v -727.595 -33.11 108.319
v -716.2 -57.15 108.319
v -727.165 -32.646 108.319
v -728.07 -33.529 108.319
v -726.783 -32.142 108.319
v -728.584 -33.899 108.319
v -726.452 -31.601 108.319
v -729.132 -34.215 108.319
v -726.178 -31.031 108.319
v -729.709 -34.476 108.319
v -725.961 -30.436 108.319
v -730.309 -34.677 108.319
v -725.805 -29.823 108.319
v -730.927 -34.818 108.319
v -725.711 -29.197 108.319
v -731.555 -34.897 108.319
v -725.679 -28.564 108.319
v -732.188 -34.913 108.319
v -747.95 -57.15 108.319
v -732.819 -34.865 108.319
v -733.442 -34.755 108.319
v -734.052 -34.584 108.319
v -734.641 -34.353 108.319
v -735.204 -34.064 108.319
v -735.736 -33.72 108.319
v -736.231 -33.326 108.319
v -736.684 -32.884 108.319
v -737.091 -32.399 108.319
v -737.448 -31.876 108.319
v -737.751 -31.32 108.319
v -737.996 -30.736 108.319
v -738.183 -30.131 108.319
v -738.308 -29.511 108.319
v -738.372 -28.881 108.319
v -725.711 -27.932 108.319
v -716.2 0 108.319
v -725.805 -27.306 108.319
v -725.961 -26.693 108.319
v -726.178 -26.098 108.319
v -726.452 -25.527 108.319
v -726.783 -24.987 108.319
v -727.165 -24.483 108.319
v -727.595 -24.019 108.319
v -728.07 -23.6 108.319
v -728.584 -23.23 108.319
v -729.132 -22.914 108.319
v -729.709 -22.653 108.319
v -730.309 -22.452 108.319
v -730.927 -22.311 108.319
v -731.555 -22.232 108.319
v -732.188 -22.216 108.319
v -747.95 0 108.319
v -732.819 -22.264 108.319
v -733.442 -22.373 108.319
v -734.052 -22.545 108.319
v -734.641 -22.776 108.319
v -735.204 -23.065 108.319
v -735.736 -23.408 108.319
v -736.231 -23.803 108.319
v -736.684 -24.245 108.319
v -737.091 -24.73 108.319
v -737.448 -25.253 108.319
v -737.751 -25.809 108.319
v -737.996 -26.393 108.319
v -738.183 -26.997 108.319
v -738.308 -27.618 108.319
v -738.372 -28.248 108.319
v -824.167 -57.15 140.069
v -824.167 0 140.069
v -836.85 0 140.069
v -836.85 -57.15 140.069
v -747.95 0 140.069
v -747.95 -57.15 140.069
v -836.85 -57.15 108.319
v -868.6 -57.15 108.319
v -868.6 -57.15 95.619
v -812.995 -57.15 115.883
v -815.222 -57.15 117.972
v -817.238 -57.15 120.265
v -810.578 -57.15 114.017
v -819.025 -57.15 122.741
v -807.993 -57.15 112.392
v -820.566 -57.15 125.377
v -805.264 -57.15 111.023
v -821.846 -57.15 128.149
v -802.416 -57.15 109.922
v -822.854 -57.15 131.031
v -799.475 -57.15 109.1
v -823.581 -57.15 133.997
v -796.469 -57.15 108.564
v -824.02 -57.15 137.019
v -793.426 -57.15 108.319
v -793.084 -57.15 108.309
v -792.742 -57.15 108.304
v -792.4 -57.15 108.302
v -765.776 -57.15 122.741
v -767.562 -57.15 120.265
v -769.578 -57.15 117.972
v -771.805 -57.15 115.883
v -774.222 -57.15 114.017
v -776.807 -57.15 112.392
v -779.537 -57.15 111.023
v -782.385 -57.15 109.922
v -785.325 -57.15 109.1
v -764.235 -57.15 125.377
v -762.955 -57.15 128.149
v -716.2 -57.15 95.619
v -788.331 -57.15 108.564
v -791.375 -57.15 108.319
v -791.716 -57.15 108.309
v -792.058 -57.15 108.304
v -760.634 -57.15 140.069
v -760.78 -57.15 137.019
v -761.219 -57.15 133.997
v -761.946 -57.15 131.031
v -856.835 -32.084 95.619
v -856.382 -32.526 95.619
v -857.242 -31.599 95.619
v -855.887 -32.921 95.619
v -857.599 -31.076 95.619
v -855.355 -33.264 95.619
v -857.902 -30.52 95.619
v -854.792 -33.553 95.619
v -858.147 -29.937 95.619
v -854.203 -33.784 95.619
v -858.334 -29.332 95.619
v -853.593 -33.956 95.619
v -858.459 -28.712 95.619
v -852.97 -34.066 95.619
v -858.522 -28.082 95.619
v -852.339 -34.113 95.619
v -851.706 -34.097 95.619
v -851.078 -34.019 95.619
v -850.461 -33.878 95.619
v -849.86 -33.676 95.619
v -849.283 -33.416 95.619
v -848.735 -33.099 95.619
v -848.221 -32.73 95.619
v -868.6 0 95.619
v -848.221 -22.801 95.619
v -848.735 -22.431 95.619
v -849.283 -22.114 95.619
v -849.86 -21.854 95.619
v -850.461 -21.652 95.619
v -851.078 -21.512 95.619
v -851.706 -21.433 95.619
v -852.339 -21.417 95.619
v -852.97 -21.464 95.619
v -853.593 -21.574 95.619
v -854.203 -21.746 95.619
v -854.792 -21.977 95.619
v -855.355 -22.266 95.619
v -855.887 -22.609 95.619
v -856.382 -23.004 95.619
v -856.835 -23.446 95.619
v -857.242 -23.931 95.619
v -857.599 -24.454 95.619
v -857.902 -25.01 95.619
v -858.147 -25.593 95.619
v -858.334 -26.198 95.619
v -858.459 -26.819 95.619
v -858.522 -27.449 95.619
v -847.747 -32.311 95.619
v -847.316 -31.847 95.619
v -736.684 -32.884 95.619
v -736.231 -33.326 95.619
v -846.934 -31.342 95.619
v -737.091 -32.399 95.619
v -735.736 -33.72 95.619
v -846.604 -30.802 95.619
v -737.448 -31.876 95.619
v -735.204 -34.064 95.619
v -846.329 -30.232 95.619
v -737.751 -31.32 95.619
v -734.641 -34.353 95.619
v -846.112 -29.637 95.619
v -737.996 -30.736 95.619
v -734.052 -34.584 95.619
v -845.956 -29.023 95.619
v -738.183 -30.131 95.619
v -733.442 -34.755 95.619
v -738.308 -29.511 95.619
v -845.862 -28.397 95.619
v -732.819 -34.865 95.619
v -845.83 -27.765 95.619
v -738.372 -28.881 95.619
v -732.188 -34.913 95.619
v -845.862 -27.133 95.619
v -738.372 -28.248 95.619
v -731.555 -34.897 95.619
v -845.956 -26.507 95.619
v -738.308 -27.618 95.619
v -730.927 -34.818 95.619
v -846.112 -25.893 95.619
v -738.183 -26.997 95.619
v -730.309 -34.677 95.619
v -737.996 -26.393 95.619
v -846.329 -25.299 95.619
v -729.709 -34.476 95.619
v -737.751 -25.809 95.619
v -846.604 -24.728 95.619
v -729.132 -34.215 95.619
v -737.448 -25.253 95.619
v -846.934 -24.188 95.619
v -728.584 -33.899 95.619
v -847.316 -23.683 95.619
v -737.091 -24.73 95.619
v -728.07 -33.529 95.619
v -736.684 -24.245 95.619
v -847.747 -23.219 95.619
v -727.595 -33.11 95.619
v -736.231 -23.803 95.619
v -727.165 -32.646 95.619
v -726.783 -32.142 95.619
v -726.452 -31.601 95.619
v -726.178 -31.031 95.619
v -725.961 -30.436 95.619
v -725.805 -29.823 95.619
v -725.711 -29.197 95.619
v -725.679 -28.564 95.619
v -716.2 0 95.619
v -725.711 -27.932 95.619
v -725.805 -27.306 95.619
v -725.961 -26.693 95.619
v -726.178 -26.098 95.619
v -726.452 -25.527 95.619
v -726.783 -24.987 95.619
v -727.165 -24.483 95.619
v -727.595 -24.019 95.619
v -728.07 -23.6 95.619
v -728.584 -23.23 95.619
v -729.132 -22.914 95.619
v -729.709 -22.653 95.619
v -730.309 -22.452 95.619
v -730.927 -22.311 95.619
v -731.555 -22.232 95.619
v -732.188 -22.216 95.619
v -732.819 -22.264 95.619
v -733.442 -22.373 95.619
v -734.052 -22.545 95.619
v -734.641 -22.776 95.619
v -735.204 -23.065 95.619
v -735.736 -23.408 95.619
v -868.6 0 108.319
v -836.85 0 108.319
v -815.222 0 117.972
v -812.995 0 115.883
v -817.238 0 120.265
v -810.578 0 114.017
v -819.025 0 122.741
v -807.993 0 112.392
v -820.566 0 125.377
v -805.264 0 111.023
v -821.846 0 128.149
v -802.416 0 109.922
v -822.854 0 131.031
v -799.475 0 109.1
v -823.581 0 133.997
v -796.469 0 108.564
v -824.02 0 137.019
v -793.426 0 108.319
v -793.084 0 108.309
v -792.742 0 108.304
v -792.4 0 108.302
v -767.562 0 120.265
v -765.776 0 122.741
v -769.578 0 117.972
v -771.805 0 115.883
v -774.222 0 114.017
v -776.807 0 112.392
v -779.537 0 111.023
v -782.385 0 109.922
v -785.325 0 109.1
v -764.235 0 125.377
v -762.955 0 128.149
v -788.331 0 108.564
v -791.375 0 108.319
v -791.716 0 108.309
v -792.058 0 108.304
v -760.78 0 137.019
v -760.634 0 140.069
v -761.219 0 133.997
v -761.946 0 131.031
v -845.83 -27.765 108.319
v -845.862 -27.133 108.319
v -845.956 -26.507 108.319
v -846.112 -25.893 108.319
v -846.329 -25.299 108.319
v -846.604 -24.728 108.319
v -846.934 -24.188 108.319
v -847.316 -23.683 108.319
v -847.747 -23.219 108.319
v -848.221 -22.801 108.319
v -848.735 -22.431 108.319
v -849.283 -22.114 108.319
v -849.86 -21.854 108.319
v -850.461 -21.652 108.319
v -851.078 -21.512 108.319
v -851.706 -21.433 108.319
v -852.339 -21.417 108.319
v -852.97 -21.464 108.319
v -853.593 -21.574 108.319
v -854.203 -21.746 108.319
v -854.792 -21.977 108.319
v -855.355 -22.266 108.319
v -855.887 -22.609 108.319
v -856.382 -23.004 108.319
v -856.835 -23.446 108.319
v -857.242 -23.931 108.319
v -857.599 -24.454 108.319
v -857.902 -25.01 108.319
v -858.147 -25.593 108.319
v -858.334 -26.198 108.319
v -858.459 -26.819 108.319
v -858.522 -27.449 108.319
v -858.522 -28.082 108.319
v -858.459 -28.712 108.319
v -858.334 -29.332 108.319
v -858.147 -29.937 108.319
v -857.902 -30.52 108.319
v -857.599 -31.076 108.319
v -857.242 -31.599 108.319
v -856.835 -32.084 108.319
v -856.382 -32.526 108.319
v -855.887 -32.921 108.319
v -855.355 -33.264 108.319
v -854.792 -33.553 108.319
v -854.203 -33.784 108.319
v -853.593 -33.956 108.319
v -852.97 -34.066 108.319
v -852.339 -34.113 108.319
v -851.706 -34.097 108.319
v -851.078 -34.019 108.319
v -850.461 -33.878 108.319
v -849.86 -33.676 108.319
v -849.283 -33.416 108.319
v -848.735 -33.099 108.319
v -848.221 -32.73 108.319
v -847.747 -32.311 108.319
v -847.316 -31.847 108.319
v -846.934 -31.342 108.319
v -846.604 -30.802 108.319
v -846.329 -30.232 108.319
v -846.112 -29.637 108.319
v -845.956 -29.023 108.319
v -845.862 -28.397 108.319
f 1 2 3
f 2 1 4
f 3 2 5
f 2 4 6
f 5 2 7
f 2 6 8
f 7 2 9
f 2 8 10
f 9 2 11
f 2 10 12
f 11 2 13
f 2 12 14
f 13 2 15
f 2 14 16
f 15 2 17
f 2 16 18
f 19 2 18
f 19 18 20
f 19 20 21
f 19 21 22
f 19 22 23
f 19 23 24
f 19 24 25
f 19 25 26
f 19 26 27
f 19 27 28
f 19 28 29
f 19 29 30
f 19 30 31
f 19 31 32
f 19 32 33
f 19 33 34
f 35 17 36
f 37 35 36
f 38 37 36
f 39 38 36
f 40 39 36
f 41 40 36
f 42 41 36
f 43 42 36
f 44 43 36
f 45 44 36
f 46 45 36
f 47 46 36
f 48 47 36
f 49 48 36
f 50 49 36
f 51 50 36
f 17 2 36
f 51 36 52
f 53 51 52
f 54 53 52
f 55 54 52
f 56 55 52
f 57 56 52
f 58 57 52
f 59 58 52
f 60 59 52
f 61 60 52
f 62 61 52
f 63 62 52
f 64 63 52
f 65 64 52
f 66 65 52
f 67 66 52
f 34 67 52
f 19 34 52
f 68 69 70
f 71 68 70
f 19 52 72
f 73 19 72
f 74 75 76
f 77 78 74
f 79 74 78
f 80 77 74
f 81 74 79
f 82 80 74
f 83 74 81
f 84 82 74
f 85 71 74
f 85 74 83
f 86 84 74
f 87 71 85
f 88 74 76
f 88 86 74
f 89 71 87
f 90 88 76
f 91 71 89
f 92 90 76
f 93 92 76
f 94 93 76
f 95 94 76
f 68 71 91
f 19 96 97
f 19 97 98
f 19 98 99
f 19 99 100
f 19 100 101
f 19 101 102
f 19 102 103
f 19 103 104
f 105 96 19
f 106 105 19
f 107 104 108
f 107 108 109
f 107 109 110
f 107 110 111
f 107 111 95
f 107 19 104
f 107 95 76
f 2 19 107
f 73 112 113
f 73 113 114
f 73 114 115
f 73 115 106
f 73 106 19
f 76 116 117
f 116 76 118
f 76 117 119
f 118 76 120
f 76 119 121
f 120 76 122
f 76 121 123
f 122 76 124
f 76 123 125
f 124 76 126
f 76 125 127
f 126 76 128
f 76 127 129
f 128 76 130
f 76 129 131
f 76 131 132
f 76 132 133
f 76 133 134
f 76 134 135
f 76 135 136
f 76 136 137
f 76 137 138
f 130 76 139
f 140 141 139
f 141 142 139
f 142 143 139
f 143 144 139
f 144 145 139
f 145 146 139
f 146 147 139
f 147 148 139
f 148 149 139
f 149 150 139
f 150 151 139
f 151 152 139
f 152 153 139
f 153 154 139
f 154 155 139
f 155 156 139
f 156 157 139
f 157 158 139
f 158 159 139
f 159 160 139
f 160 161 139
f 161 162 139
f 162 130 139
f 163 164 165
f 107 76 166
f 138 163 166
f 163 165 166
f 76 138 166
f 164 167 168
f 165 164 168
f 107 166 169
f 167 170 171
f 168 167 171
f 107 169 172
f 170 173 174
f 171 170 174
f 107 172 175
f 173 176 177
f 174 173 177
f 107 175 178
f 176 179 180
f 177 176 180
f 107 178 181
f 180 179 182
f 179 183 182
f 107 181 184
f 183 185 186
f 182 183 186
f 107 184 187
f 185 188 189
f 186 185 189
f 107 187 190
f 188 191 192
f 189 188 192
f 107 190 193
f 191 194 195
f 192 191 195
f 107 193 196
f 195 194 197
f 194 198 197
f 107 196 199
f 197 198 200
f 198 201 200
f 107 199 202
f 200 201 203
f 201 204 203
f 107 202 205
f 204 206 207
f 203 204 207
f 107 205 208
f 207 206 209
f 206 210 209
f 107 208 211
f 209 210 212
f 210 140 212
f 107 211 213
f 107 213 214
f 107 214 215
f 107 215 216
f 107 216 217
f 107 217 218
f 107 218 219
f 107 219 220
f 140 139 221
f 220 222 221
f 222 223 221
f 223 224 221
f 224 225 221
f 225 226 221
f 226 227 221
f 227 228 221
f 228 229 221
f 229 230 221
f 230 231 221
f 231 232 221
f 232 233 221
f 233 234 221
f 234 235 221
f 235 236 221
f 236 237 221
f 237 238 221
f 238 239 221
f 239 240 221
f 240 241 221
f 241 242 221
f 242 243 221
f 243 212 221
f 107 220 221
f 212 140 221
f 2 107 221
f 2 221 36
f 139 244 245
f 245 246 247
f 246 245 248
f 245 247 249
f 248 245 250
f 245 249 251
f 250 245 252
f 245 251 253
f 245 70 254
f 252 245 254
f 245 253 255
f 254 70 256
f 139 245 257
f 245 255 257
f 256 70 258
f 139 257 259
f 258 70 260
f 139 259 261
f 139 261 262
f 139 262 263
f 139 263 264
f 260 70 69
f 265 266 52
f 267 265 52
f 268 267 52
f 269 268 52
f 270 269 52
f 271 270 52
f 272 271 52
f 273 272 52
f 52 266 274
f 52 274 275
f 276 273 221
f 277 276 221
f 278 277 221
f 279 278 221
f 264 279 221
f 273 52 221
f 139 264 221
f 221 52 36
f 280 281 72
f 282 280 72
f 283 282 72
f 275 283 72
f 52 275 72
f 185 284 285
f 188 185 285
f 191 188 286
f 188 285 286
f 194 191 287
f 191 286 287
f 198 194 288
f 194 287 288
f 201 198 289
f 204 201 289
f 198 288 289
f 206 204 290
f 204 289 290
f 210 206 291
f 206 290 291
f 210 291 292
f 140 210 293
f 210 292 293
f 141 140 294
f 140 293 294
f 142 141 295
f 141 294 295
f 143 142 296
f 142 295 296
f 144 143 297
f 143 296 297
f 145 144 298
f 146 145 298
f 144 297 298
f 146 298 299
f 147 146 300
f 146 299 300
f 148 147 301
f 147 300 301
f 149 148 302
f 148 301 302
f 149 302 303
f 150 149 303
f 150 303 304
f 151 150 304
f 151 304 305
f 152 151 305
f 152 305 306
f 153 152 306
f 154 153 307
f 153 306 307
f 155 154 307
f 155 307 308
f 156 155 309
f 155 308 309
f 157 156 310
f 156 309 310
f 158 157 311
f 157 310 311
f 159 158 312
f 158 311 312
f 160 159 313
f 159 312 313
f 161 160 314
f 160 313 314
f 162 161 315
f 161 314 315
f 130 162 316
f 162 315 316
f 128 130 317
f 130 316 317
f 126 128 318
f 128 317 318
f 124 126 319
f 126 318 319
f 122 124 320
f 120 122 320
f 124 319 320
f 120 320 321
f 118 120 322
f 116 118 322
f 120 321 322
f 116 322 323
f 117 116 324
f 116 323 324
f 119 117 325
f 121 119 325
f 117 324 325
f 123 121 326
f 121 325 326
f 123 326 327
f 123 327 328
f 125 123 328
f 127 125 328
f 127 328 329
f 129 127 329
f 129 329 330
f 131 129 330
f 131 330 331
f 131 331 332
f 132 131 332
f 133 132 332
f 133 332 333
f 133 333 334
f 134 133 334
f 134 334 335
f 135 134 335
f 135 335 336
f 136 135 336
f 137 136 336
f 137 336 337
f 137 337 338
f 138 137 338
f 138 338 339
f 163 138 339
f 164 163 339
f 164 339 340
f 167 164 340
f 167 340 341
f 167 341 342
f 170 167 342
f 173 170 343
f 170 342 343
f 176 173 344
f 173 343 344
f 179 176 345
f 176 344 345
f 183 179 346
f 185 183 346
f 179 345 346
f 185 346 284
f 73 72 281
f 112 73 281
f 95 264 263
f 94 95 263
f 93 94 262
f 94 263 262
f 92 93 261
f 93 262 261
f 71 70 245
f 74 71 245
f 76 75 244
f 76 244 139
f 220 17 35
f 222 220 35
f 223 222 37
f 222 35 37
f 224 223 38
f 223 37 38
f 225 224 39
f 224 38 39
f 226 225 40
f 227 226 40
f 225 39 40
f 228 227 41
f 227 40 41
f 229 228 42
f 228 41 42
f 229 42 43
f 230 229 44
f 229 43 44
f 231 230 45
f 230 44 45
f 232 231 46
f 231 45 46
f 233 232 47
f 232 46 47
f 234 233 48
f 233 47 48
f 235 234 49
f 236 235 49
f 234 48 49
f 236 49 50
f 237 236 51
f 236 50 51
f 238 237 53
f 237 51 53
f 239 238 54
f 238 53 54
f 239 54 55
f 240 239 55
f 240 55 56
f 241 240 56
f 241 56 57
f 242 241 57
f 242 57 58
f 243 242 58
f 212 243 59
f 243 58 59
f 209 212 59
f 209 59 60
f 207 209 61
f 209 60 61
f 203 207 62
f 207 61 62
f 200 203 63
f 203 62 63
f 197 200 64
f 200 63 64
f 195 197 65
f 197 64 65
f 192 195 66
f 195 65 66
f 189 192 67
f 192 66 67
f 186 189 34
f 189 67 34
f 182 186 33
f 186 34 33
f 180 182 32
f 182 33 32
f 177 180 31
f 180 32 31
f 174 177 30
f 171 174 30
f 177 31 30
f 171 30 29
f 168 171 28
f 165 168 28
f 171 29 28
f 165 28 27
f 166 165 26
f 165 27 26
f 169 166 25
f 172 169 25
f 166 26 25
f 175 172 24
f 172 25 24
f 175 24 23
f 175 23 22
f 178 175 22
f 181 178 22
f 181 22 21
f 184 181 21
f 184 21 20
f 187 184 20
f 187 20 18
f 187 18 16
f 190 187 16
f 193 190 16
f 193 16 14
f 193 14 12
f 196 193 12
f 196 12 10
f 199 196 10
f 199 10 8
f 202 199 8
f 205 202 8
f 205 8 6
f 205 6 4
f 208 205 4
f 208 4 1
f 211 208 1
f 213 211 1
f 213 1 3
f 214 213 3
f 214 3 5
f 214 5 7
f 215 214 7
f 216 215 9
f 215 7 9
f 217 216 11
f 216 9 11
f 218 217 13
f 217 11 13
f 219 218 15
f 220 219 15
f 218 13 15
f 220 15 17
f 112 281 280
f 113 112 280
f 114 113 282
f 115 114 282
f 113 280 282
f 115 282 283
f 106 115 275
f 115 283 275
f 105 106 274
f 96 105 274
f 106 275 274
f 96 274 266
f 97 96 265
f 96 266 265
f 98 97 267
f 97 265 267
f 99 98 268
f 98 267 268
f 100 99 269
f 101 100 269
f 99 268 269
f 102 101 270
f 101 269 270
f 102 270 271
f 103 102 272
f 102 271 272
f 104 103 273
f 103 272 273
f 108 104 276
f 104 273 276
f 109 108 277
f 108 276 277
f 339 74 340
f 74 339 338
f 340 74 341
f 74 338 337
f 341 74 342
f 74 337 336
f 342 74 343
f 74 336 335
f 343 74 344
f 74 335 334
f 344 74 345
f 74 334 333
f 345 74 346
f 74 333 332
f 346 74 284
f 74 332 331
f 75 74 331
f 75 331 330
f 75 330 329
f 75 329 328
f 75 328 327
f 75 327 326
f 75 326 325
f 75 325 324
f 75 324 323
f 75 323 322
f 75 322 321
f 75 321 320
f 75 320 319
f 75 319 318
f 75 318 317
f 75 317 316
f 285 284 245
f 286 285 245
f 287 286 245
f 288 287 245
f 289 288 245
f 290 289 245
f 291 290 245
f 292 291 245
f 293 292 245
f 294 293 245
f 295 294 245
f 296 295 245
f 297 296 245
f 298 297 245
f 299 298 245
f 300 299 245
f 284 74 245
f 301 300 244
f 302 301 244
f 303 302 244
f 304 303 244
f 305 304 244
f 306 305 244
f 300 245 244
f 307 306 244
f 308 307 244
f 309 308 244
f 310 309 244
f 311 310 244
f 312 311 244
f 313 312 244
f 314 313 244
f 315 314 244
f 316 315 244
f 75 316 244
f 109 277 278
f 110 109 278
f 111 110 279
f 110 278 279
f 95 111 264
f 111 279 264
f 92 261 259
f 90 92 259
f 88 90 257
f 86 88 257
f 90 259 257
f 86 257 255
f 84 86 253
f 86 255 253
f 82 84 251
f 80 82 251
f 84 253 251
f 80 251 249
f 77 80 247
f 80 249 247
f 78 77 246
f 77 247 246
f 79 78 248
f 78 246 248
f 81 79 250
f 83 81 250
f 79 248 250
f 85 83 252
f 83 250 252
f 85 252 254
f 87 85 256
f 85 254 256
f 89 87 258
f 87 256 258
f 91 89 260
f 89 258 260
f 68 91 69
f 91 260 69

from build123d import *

# Parameters (mm, degrees)
F1_DEPTH = 57.15
F3_R     = 6.35
F4_DEPTH = 12.7
F6_R     = 6.3501577228
F7_DEPTH = 12.7


with BuildPart() as f1:
    # F0 (on Front) → F1 (new body)
    with BuildSketch(Plane.XZ):
        with BuildLine():
            Line((-836.8502492905, 108.3186204791), (-868.6002492905, 108.3186204791))
            Line((-868.6002492905, 108.3186204791), (-868.6002492905, 95.6186204791))
            Line((-868.6002492905, 95.6186204791), (-792.4002492905, 95.6186204791))
            Line((-792.4002492905, 95.6186204791), (-716.2002492905, 95.6186204791))
            Line((-716.2002492905, 95.6186204791), (-716.2002492905, 108.3186204791))
            Line((-716.2002492905, 108.3186204791), (-747.9502492905, 108.3186204791))
            Line((-747.9502492905, 108.3186204791), (-747.9502492905, 140.0686204791))
            Line((-747.9502492905, 140.0686204791), (-760.6336884818, 140.0686204791))
            ThreePointArc((-760.6336884818, 140.0686204791), (-769.5781696434, 117.9718545123), (-791.3746345435, 108.3186204791))
            ThreePointArc((-791.3746345435, 108.3186204791), (-791.8873750687, 108.3062001425), (-792.4002492905, 108.3020596705))
            ThreePointArc((-792.4002492905, 108.3020596705), (-792.9131235123, 108.3062001425), (-793.4258640374, 108.3186204791))
            ThreePointArc((-793.4258640374, 108.3186204791), (-815.2223289375, 117.9718545123), (-824.1668100991, 140.0686204791))
            Line((-824.1668100991, 140.0686204791), (-836.8502492905, 140.0686204791))
            Line((-836.8502492905, 140.0686204791), (-836.8502492905, 108.3186204791))
        make_face()
    extrude(amount=F1_DEPTH)

    # F3 (on offset) → F4 (cut)
    with BuildSketch(Plane.XY.offset(108.3186204791)):
        with Locations((-852.1803617477, -27.7651418)):
            Circle(F3_R)
    extrude(amount=-F4_DEPTH, mode=Mode.SUBTRACT)

    # F6 (on offset) → F7 (cut)
    with BuildSketch(Plane.XY.offset(108.3186204791)):
        with Locations((-732.0292592049, -28.564395383)):
            Circle(F6_R)
    extrude(amount=-F7_DEPTH, mode=Mode.SUBTRACT)


solid = f1.part
